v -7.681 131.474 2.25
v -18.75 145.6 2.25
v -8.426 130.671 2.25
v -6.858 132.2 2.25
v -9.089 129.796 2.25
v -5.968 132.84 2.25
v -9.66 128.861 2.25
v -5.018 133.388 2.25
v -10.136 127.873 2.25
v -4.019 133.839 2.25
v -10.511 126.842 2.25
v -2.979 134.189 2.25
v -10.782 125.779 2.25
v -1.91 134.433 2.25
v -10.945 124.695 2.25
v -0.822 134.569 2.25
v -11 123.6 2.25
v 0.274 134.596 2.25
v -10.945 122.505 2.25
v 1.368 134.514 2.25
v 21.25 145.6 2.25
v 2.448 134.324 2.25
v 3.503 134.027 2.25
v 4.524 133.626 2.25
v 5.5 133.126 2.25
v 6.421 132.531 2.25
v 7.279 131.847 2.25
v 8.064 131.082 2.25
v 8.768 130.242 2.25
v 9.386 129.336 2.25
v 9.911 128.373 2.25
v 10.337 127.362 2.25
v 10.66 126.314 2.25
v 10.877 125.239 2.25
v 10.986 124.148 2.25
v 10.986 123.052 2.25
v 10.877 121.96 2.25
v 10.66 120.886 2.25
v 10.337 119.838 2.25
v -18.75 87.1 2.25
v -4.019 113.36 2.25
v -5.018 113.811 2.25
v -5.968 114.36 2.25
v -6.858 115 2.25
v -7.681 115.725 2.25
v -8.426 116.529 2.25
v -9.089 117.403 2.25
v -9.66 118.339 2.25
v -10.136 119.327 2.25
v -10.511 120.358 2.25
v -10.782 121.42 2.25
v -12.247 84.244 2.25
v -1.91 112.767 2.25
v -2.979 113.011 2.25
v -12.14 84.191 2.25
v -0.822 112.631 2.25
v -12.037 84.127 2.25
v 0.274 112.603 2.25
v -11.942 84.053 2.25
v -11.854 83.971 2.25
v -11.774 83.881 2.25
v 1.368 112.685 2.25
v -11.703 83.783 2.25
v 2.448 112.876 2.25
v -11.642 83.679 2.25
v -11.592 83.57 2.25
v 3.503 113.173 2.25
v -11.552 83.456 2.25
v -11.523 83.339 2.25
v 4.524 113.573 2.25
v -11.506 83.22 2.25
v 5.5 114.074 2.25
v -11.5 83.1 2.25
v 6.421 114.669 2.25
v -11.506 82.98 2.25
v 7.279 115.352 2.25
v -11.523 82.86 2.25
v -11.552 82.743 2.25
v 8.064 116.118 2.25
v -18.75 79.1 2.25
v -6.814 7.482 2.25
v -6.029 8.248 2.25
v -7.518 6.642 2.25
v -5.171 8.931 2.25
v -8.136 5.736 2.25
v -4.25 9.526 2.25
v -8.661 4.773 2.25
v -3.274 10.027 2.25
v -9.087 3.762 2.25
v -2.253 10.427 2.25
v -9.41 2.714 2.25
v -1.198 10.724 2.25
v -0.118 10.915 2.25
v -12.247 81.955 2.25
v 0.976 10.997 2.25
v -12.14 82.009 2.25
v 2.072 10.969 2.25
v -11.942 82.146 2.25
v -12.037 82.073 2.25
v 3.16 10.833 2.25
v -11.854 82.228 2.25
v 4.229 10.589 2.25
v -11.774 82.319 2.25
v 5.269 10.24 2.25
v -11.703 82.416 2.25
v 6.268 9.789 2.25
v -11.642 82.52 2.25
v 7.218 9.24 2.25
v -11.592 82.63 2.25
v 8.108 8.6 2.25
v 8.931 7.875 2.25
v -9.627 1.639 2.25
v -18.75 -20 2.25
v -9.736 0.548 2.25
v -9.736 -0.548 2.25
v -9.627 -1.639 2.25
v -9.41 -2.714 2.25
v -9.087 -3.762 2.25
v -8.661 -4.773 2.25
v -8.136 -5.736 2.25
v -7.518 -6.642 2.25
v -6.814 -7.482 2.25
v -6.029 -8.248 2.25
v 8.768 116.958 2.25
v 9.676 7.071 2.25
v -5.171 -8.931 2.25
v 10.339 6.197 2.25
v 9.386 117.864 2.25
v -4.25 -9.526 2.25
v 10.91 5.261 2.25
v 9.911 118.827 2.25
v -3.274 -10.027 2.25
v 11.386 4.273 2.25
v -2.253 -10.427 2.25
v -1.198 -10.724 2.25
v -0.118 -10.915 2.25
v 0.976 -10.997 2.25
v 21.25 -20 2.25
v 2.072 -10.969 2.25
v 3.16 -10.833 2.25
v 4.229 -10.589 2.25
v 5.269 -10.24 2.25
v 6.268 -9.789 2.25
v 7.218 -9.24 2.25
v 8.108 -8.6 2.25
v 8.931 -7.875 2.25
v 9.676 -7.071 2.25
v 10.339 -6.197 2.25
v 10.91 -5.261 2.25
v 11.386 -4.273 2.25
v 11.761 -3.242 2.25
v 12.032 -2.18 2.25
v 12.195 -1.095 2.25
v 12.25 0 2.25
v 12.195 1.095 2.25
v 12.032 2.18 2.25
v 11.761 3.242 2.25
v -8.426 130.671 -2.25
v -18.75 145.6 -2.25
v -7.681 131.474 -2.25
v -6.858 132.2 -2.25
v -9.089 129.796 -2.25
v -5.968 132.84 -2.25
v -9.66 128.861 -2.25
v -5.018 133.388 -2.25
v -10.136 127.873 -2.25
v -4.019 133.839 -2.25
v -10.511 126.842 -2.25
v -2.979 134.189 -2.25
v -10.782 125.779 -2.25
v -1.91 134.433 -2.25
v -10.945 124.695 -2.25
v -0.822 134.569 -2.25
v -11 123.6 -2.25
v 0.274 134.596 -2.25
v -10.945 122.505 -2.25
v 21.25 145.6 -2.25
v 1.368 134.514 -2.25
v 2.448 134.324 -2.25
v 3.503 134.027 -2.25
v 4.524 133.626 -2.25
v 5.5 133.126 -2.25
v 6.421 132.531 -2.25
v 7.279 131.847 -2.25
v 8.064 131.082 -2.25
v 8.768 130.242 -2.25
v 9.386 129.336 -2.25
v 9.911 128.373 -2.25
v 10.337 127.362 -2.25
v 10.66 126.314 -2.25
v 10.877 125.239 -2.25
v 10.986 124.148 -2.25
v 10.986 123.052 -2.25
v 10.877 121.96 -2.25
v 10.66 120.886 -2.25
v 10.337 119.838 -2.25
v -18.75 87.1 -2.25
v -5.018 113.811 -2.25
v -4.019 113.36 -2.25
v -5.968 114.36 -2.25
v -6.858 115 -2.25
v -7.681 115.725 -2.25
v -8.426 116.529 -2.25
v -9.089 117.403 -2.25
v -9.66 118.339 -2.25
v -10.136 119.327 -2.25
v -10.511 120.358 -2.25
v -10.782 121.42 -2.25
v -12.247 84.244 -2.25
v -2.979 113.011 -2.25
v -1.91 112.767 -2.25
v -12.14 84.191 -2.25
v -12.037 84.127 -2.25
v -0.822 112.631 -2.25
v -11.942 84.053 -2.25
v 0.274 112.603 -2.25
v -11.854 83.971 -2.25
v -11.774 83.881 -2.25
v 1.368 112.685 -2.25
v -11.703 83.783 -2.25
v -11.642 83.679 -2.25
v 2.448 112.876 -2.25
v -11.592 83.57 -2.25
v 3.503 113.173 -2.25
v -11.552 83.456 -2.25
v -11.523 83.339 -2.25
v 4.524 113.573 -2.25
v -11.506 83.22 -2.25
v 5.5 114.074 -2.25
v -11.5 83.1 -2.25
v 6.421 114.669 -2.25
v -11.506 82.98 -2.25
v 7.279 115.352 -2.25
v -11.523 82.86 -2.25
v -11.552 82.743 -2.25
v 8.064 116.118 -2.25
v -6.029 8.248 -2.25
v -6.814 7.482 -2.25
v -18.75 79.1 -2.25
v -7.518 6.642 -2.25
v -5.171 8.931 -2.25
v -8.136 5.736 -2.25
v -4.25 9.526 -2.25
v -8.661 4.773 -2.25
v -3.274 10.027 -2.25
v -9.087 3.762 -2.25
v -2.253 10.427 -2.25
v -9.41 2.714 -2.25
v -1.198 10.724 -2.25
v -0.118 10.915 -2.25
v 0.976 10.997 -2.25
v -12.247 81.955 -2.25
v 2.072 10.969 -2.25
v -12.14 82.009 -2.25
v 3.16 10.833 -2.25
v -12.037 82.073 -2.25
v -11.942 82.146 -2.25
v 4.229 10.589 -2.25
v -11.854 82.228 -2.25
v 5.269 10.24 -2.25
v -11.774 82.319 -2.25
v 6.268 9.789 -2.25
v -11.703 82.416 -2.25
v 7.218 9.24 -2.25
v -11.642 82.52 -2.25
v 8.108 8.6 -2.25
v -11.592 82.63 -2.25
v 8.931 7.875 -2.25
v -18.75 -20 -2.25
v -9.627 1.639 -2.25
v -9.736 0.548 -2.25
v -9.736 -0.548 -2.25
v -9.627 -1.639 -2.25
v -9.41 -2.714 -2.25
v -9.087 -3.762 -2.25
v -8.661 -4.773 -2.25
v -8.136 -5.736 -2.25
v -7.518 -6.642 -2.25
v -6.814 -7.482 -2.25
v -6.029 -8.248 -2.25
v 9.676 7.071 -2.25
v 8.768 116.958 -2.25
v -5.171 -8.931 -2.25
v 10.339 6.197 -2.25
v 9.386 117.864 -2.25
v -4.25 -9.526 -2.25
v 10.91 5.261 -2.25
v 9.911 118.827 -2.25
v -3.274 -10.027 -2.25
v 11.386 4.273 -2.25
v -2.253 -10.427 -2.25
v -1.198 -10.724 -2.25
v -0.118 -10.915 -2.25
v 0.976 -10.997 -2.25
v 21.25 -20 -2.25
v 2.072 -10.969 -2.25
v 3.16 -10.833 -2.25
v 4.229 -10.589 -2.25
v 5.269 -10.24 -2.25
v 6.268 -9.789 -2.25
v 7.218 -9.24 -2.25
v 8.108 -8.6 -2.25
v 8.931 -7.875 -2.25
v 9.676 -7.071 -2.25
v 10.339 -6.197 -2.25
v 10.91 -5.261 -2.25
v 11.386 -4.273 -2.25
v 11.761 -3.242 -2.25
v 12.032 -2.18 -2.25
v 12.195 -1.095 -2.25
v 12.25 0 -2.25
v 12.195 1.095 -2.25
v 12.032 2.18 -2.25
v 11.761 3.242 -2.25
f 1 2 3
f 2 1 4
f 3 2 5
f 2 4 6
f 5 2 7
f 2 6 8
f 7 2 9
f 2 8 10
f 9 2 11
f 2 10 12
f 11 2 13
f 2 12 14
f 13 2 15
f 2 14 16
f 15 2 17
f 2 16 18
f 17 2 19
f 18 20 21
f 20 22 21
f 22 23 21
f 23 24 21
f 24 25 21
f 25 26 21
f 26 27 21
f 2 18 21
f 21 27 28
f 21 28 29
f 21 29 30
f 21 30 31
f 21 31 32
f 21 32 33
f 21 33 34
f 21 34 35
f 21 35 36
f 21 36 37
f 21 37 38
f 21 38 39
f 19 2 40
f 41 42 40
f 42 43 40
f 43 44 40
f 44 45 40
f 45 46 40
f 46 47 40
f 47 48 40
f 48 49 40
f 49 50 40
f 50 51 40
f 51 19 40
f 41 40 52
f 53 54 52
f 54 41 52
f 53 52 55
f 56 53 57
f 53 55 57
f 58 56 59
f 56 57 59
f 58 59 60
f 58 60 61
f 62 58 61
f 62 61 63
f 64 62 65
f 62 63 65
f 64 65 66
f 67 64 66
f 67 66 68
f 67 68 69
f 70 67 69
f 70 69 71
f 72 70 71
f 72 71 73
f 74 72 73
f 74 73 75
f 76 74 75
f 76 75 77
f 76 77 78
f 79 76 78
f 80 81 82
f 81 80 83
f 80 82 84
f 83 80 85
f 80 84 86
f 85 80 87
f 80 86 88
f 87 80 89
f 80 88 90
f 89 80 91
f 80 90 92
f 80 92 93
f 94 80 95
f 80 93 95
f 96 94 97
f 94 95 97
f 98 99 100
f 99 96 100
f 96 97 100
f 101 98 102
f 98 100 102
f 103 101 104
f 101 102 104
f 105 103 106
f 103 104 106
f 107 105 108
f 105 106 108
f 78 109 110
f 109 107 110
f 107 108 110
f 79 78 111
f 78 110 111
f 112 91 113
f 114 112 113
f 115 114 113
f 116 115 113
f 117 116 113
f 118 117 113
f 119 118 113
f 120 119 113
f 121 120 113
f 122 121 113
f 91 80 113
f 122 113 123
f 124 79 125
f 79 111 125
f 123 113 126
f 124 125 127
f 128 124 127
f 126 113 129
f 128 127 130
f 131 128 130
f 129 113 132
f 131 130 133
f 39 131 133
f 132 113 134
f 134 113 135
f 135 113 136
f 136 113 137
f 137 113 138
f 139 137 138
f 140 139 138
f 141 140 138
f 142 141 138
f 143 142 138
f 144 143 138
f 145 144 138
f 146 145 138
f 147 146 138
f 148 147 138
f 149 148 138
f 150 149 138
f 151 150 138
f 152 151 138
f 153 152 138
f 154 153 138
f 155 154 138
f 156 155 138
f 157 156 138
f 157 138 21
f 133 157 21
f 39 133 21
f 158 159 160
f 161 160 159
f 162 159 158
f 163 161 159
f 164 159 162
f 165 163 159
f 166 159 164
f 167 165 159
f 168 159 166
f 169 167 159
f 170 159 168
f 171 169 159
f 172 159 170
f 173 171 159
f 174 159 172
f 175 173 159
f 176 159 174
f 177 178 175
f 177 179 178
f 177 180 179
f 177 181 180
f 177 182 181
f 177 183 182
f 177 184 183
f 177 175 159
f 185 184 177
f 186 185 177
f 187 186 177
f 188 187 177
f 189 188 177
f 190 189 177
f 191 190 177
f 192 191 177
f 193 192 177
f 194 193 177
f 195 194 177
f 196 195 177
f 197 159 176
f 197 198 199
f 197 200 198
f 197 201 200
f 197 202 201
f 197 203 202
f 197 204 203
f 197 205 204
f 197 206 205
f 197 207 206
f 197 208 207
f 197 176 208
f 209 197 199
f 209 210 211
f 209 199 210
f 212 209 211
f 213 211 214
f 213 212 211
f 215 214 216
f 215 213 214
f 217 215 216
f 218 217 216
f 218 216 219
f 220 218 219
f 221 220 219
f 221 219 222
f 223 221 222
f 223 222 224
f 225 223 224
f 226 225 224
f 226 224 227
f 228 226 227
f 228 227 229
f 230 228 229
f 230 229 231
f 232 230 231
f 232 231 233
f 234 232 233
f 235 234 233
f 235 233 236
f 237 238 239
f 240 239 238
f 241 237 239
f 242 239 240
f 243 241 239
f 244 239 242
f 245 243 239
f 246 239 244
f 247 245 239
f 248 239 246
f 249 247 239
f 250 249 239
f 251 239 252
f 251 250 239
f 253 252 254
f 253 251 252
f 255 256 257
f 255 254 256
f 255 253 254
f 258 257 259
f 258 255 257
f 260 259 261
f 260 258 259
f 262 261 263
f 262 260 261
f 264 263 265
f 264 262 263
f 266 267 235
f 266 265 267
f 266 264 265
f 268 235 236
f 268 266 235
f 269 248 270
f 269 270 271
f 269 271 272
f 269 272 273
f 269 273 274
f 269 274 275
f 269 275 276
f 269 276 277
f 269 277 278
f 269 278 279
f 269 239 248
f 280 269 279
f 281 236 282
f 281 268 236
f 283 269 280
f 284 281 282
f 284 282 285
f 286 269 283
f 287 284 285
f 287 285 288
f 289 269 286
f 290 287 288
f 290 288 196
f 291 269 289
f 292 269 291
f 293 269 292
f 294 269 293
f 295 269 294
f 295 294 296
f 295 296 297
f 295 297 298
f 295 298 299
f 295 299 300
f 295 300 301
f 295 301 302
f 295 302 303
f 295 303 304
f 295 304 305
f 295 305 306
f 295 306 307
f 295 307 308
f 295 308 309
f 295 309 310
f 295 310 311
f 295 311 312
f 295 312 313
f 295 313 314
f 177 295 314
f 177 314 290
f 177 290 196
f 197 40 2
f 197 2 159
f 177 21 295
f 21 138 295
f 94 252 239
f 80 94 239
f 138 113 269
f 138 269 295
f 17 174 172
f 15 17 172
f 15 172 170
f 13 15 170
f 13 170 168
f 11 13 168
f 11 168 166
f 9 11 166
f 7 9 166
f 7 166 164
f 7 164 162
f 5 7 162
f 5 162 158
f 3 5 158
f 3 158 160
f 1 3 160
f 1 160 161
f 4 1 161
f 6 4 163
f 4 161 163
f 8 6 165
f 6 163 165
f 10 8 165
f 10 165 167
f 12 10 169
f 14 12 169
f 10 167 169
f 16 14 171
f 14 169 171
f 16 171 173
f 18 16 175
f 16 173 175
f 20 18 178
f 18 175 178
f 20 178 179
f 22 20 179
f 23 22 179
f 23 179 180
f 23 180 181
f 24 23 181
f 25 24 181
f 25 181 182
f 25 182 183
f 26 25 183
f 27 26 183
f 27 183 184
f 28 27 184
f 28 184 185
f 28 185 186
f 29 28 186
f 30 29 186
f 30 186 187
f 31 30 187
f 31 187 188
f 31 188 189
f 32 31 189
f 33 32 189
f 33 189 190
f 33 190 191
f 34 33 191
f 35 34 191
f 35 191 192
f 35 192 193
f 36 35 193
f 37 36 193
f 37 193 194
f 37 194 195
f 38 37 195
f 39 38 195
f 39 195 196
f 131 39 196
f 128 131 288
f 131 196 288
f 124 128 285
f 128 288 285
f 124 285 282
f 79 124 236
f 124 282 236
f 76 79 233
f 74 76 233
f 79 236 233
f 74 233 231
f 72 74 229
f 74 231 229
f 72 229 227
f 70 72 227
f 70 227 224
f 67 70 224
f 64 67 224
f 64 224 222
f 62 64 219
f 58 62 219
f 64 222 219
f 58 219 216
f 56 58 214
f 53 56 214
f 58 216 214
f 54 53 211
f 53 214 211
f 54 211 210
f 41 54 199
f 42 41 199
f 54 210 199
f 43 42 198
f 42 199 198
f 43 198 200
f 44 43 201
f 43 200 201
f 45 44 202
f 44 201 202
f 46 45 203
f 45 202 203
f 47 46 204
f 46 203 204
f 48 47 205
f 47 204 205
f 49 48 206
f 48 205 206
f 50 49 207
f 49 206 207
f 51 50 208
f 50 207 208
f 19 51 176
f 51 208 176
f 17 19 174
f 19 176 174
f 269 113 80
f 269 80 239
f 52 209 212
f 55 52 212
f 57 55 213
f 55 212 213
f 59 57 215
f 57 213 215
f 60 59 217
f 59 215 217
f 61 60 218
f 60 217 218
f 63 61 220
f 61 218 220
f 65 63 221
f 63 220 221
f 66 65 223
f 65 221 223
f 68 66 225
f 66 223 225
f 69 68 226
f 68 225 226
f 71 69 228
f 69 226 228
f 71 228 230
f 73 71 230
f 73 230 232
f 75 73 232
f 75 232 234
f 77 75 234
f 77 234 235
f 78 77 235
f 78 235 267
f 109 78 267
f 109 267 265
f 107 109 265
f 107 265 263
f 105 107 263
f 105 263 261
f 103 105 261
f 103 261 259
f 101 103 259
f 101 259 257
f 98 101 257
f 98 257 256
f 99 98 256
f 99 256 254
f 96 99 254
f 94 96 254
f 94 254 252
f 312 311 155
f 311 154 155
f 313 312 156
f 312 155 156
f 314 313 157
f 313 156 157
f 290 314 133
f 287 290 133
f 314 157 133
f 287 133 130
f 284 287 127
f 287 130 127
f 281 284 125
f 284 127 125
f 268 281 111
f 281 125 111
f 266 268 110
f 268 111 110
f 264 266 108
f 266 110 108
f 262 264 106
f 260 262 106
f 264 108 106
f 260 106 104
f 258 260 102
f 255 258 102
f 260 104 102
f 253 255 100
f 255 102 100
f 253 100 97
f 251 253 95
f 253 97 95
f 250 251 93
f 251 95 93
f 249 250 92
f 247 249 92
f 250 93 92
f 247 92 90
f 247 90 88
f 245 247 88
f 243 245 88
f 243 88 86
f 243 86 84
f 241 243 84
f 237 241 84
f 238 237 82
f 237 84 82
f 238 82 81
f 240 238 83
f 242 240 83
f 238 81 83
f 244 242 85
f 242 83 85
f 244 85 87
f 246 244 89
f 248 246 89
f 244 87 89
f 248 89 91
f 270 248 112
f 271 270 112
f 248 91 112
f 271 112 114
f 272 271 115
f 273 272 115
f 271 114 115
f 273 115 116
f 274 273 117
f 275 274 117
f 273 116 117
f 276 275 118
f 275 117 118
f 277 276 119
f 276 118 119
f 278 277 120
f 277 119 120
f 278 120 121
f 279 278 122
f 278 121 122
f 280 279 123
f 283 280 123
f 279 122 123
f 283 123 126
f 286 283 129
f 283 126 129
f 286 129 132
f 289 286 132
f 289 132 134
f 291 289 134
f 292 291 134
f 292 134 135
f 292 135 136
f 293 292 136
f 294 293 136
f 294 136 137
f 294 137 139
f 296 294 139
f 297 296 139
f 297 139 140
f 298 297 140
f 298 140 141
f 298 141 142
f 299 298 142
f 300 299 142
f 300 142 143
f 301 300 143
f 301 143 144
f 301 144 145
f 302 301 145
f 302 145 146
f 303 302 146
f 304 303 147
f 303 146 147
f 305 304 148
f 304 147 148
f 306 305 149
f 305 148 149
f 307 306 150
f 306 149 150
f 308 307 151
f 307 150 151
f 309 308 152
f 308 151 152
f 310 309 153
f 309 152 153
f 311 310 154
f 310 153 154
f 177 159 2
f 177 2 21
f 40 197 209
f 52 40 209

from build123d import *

# Parameters (mm, degrees)
SKETCH1_W           = 42.5
SKETCH1_H           = 40
BOSS_EXTRUDE1_DEPTH = 2.25
SKETCH3_R           = 11
CUT_EXTRUDE2_DEPTH  = 5
SKETCH4_W           = 42.5
SKETCH4_H           = 4.5
BOSS_EXTRUDE2_DEPTH = 15
SKETCH8_W           = 2.5
SKETCH8_H           = 55
CUT_EXTRUDE4_DEPTH  = 10
SKETCH9_W           = 40
SKETCH9_H           = 4.5
BOSS_EXTRUDE3_DEPTH = 110.599864081
SKETCH11_R          = 11
CUT_EXTRUDE5_DEPTH  = 100
CUT_EXTRUDE6_DEPTH  = 100


with BuildPart() as part:
    # Sketch1 → Boss-Extrude1 (new, symmetric)
    with BuildSketch(Plane.XY):
        Rectangle(SKETCH1_W, SKETCH1_H)
    extrude(amount=BOSS_EXTRUDE1_DEPTH, both=True)

    # Sketch3 → Cut-Extrude2 (cut, symmetric)
    with BuildSketch(Plane.XY.offset(2.25)):
        with Locations((1.25, 0)):
            Circle(SKETCH3_R)
    extrude(amount=CUT_EXTRUDE2_DEPTH, both=True, mode=Mode.SUBTRACT)

    # Sketch4 → Boss-Extrude2 (add)
    with BuildSketch(Plane(origin=(0, 20, 0), x_dir=(1, 0, 0), z_dir=(0, 1, 0))):
        Rectangle(SKETCH4_W, SKETCH4_H)
    extrude(amount=BOSS_EXTRUDE2_DEPTH)

    # Sketch8 → Cut-Extrude4 (cut)
    with BuildSketch(Plane.XY.offset(2.25)):
        with Locations((-20, 7.5)):
            Rectangle(SKETCH8_W, SKETCH8_H)
    extrude(amount=-CUT_EXTRUDE4_DEPTH, mode=Mode.SUBTRACT)

    # Sketch9 → Boss-Extrude3 (add)
    with BuildSketch(Plane(origin=(0, 35, 0), x_dir=(1, 0, 0), z_dir=(0, 1, 0))):
        with Locations((1.25, 0)):
            Rectangle(SKETCH9_W, SKETCH9_H)
    extrude(amount=BOSS_EXTRUDE3_DEPTH)

    # Sketch11 → Cut-Extrude5 (cut)
    with BuildSketch(Plane(origin=(0, 0, -2.25), x_dir=(-1, 0, 0), z_dir=(0, 0, -1))):
        with Locations((0, 123.599864081)):
            Circle(SKETCH11_R)
    extrude(amount=-CUT_EXTRUDE5_DEPTH, mode=Mode.SUBTRACT)

    # Sketch12 → Cut-Extrude6 (cut)
    with BuildSketch(Plane(origin=(0, 0, -2.25), x_dir=(-1, 0, 0), z_dir=(0, 0, -1))):
        with BuildLine():
            Line((18.75, 79.099864081), (18.75, 87.099864081))
            Line((18.75, 87.099864081), (12.247409908, 84.244374107))
            ThreePointArc((12.247409908, 84.244374107), (11.5, 83.099864066), (12.247409936, 81.955354043))
            Line((12.247409936, 81.955354043), (18.75, 79.099864081))
        make_face()
    extrude(amount=-CUT_EXTRUDE6_DEPTH, mode=Mode.SUBTRACT)


solid = part.part
